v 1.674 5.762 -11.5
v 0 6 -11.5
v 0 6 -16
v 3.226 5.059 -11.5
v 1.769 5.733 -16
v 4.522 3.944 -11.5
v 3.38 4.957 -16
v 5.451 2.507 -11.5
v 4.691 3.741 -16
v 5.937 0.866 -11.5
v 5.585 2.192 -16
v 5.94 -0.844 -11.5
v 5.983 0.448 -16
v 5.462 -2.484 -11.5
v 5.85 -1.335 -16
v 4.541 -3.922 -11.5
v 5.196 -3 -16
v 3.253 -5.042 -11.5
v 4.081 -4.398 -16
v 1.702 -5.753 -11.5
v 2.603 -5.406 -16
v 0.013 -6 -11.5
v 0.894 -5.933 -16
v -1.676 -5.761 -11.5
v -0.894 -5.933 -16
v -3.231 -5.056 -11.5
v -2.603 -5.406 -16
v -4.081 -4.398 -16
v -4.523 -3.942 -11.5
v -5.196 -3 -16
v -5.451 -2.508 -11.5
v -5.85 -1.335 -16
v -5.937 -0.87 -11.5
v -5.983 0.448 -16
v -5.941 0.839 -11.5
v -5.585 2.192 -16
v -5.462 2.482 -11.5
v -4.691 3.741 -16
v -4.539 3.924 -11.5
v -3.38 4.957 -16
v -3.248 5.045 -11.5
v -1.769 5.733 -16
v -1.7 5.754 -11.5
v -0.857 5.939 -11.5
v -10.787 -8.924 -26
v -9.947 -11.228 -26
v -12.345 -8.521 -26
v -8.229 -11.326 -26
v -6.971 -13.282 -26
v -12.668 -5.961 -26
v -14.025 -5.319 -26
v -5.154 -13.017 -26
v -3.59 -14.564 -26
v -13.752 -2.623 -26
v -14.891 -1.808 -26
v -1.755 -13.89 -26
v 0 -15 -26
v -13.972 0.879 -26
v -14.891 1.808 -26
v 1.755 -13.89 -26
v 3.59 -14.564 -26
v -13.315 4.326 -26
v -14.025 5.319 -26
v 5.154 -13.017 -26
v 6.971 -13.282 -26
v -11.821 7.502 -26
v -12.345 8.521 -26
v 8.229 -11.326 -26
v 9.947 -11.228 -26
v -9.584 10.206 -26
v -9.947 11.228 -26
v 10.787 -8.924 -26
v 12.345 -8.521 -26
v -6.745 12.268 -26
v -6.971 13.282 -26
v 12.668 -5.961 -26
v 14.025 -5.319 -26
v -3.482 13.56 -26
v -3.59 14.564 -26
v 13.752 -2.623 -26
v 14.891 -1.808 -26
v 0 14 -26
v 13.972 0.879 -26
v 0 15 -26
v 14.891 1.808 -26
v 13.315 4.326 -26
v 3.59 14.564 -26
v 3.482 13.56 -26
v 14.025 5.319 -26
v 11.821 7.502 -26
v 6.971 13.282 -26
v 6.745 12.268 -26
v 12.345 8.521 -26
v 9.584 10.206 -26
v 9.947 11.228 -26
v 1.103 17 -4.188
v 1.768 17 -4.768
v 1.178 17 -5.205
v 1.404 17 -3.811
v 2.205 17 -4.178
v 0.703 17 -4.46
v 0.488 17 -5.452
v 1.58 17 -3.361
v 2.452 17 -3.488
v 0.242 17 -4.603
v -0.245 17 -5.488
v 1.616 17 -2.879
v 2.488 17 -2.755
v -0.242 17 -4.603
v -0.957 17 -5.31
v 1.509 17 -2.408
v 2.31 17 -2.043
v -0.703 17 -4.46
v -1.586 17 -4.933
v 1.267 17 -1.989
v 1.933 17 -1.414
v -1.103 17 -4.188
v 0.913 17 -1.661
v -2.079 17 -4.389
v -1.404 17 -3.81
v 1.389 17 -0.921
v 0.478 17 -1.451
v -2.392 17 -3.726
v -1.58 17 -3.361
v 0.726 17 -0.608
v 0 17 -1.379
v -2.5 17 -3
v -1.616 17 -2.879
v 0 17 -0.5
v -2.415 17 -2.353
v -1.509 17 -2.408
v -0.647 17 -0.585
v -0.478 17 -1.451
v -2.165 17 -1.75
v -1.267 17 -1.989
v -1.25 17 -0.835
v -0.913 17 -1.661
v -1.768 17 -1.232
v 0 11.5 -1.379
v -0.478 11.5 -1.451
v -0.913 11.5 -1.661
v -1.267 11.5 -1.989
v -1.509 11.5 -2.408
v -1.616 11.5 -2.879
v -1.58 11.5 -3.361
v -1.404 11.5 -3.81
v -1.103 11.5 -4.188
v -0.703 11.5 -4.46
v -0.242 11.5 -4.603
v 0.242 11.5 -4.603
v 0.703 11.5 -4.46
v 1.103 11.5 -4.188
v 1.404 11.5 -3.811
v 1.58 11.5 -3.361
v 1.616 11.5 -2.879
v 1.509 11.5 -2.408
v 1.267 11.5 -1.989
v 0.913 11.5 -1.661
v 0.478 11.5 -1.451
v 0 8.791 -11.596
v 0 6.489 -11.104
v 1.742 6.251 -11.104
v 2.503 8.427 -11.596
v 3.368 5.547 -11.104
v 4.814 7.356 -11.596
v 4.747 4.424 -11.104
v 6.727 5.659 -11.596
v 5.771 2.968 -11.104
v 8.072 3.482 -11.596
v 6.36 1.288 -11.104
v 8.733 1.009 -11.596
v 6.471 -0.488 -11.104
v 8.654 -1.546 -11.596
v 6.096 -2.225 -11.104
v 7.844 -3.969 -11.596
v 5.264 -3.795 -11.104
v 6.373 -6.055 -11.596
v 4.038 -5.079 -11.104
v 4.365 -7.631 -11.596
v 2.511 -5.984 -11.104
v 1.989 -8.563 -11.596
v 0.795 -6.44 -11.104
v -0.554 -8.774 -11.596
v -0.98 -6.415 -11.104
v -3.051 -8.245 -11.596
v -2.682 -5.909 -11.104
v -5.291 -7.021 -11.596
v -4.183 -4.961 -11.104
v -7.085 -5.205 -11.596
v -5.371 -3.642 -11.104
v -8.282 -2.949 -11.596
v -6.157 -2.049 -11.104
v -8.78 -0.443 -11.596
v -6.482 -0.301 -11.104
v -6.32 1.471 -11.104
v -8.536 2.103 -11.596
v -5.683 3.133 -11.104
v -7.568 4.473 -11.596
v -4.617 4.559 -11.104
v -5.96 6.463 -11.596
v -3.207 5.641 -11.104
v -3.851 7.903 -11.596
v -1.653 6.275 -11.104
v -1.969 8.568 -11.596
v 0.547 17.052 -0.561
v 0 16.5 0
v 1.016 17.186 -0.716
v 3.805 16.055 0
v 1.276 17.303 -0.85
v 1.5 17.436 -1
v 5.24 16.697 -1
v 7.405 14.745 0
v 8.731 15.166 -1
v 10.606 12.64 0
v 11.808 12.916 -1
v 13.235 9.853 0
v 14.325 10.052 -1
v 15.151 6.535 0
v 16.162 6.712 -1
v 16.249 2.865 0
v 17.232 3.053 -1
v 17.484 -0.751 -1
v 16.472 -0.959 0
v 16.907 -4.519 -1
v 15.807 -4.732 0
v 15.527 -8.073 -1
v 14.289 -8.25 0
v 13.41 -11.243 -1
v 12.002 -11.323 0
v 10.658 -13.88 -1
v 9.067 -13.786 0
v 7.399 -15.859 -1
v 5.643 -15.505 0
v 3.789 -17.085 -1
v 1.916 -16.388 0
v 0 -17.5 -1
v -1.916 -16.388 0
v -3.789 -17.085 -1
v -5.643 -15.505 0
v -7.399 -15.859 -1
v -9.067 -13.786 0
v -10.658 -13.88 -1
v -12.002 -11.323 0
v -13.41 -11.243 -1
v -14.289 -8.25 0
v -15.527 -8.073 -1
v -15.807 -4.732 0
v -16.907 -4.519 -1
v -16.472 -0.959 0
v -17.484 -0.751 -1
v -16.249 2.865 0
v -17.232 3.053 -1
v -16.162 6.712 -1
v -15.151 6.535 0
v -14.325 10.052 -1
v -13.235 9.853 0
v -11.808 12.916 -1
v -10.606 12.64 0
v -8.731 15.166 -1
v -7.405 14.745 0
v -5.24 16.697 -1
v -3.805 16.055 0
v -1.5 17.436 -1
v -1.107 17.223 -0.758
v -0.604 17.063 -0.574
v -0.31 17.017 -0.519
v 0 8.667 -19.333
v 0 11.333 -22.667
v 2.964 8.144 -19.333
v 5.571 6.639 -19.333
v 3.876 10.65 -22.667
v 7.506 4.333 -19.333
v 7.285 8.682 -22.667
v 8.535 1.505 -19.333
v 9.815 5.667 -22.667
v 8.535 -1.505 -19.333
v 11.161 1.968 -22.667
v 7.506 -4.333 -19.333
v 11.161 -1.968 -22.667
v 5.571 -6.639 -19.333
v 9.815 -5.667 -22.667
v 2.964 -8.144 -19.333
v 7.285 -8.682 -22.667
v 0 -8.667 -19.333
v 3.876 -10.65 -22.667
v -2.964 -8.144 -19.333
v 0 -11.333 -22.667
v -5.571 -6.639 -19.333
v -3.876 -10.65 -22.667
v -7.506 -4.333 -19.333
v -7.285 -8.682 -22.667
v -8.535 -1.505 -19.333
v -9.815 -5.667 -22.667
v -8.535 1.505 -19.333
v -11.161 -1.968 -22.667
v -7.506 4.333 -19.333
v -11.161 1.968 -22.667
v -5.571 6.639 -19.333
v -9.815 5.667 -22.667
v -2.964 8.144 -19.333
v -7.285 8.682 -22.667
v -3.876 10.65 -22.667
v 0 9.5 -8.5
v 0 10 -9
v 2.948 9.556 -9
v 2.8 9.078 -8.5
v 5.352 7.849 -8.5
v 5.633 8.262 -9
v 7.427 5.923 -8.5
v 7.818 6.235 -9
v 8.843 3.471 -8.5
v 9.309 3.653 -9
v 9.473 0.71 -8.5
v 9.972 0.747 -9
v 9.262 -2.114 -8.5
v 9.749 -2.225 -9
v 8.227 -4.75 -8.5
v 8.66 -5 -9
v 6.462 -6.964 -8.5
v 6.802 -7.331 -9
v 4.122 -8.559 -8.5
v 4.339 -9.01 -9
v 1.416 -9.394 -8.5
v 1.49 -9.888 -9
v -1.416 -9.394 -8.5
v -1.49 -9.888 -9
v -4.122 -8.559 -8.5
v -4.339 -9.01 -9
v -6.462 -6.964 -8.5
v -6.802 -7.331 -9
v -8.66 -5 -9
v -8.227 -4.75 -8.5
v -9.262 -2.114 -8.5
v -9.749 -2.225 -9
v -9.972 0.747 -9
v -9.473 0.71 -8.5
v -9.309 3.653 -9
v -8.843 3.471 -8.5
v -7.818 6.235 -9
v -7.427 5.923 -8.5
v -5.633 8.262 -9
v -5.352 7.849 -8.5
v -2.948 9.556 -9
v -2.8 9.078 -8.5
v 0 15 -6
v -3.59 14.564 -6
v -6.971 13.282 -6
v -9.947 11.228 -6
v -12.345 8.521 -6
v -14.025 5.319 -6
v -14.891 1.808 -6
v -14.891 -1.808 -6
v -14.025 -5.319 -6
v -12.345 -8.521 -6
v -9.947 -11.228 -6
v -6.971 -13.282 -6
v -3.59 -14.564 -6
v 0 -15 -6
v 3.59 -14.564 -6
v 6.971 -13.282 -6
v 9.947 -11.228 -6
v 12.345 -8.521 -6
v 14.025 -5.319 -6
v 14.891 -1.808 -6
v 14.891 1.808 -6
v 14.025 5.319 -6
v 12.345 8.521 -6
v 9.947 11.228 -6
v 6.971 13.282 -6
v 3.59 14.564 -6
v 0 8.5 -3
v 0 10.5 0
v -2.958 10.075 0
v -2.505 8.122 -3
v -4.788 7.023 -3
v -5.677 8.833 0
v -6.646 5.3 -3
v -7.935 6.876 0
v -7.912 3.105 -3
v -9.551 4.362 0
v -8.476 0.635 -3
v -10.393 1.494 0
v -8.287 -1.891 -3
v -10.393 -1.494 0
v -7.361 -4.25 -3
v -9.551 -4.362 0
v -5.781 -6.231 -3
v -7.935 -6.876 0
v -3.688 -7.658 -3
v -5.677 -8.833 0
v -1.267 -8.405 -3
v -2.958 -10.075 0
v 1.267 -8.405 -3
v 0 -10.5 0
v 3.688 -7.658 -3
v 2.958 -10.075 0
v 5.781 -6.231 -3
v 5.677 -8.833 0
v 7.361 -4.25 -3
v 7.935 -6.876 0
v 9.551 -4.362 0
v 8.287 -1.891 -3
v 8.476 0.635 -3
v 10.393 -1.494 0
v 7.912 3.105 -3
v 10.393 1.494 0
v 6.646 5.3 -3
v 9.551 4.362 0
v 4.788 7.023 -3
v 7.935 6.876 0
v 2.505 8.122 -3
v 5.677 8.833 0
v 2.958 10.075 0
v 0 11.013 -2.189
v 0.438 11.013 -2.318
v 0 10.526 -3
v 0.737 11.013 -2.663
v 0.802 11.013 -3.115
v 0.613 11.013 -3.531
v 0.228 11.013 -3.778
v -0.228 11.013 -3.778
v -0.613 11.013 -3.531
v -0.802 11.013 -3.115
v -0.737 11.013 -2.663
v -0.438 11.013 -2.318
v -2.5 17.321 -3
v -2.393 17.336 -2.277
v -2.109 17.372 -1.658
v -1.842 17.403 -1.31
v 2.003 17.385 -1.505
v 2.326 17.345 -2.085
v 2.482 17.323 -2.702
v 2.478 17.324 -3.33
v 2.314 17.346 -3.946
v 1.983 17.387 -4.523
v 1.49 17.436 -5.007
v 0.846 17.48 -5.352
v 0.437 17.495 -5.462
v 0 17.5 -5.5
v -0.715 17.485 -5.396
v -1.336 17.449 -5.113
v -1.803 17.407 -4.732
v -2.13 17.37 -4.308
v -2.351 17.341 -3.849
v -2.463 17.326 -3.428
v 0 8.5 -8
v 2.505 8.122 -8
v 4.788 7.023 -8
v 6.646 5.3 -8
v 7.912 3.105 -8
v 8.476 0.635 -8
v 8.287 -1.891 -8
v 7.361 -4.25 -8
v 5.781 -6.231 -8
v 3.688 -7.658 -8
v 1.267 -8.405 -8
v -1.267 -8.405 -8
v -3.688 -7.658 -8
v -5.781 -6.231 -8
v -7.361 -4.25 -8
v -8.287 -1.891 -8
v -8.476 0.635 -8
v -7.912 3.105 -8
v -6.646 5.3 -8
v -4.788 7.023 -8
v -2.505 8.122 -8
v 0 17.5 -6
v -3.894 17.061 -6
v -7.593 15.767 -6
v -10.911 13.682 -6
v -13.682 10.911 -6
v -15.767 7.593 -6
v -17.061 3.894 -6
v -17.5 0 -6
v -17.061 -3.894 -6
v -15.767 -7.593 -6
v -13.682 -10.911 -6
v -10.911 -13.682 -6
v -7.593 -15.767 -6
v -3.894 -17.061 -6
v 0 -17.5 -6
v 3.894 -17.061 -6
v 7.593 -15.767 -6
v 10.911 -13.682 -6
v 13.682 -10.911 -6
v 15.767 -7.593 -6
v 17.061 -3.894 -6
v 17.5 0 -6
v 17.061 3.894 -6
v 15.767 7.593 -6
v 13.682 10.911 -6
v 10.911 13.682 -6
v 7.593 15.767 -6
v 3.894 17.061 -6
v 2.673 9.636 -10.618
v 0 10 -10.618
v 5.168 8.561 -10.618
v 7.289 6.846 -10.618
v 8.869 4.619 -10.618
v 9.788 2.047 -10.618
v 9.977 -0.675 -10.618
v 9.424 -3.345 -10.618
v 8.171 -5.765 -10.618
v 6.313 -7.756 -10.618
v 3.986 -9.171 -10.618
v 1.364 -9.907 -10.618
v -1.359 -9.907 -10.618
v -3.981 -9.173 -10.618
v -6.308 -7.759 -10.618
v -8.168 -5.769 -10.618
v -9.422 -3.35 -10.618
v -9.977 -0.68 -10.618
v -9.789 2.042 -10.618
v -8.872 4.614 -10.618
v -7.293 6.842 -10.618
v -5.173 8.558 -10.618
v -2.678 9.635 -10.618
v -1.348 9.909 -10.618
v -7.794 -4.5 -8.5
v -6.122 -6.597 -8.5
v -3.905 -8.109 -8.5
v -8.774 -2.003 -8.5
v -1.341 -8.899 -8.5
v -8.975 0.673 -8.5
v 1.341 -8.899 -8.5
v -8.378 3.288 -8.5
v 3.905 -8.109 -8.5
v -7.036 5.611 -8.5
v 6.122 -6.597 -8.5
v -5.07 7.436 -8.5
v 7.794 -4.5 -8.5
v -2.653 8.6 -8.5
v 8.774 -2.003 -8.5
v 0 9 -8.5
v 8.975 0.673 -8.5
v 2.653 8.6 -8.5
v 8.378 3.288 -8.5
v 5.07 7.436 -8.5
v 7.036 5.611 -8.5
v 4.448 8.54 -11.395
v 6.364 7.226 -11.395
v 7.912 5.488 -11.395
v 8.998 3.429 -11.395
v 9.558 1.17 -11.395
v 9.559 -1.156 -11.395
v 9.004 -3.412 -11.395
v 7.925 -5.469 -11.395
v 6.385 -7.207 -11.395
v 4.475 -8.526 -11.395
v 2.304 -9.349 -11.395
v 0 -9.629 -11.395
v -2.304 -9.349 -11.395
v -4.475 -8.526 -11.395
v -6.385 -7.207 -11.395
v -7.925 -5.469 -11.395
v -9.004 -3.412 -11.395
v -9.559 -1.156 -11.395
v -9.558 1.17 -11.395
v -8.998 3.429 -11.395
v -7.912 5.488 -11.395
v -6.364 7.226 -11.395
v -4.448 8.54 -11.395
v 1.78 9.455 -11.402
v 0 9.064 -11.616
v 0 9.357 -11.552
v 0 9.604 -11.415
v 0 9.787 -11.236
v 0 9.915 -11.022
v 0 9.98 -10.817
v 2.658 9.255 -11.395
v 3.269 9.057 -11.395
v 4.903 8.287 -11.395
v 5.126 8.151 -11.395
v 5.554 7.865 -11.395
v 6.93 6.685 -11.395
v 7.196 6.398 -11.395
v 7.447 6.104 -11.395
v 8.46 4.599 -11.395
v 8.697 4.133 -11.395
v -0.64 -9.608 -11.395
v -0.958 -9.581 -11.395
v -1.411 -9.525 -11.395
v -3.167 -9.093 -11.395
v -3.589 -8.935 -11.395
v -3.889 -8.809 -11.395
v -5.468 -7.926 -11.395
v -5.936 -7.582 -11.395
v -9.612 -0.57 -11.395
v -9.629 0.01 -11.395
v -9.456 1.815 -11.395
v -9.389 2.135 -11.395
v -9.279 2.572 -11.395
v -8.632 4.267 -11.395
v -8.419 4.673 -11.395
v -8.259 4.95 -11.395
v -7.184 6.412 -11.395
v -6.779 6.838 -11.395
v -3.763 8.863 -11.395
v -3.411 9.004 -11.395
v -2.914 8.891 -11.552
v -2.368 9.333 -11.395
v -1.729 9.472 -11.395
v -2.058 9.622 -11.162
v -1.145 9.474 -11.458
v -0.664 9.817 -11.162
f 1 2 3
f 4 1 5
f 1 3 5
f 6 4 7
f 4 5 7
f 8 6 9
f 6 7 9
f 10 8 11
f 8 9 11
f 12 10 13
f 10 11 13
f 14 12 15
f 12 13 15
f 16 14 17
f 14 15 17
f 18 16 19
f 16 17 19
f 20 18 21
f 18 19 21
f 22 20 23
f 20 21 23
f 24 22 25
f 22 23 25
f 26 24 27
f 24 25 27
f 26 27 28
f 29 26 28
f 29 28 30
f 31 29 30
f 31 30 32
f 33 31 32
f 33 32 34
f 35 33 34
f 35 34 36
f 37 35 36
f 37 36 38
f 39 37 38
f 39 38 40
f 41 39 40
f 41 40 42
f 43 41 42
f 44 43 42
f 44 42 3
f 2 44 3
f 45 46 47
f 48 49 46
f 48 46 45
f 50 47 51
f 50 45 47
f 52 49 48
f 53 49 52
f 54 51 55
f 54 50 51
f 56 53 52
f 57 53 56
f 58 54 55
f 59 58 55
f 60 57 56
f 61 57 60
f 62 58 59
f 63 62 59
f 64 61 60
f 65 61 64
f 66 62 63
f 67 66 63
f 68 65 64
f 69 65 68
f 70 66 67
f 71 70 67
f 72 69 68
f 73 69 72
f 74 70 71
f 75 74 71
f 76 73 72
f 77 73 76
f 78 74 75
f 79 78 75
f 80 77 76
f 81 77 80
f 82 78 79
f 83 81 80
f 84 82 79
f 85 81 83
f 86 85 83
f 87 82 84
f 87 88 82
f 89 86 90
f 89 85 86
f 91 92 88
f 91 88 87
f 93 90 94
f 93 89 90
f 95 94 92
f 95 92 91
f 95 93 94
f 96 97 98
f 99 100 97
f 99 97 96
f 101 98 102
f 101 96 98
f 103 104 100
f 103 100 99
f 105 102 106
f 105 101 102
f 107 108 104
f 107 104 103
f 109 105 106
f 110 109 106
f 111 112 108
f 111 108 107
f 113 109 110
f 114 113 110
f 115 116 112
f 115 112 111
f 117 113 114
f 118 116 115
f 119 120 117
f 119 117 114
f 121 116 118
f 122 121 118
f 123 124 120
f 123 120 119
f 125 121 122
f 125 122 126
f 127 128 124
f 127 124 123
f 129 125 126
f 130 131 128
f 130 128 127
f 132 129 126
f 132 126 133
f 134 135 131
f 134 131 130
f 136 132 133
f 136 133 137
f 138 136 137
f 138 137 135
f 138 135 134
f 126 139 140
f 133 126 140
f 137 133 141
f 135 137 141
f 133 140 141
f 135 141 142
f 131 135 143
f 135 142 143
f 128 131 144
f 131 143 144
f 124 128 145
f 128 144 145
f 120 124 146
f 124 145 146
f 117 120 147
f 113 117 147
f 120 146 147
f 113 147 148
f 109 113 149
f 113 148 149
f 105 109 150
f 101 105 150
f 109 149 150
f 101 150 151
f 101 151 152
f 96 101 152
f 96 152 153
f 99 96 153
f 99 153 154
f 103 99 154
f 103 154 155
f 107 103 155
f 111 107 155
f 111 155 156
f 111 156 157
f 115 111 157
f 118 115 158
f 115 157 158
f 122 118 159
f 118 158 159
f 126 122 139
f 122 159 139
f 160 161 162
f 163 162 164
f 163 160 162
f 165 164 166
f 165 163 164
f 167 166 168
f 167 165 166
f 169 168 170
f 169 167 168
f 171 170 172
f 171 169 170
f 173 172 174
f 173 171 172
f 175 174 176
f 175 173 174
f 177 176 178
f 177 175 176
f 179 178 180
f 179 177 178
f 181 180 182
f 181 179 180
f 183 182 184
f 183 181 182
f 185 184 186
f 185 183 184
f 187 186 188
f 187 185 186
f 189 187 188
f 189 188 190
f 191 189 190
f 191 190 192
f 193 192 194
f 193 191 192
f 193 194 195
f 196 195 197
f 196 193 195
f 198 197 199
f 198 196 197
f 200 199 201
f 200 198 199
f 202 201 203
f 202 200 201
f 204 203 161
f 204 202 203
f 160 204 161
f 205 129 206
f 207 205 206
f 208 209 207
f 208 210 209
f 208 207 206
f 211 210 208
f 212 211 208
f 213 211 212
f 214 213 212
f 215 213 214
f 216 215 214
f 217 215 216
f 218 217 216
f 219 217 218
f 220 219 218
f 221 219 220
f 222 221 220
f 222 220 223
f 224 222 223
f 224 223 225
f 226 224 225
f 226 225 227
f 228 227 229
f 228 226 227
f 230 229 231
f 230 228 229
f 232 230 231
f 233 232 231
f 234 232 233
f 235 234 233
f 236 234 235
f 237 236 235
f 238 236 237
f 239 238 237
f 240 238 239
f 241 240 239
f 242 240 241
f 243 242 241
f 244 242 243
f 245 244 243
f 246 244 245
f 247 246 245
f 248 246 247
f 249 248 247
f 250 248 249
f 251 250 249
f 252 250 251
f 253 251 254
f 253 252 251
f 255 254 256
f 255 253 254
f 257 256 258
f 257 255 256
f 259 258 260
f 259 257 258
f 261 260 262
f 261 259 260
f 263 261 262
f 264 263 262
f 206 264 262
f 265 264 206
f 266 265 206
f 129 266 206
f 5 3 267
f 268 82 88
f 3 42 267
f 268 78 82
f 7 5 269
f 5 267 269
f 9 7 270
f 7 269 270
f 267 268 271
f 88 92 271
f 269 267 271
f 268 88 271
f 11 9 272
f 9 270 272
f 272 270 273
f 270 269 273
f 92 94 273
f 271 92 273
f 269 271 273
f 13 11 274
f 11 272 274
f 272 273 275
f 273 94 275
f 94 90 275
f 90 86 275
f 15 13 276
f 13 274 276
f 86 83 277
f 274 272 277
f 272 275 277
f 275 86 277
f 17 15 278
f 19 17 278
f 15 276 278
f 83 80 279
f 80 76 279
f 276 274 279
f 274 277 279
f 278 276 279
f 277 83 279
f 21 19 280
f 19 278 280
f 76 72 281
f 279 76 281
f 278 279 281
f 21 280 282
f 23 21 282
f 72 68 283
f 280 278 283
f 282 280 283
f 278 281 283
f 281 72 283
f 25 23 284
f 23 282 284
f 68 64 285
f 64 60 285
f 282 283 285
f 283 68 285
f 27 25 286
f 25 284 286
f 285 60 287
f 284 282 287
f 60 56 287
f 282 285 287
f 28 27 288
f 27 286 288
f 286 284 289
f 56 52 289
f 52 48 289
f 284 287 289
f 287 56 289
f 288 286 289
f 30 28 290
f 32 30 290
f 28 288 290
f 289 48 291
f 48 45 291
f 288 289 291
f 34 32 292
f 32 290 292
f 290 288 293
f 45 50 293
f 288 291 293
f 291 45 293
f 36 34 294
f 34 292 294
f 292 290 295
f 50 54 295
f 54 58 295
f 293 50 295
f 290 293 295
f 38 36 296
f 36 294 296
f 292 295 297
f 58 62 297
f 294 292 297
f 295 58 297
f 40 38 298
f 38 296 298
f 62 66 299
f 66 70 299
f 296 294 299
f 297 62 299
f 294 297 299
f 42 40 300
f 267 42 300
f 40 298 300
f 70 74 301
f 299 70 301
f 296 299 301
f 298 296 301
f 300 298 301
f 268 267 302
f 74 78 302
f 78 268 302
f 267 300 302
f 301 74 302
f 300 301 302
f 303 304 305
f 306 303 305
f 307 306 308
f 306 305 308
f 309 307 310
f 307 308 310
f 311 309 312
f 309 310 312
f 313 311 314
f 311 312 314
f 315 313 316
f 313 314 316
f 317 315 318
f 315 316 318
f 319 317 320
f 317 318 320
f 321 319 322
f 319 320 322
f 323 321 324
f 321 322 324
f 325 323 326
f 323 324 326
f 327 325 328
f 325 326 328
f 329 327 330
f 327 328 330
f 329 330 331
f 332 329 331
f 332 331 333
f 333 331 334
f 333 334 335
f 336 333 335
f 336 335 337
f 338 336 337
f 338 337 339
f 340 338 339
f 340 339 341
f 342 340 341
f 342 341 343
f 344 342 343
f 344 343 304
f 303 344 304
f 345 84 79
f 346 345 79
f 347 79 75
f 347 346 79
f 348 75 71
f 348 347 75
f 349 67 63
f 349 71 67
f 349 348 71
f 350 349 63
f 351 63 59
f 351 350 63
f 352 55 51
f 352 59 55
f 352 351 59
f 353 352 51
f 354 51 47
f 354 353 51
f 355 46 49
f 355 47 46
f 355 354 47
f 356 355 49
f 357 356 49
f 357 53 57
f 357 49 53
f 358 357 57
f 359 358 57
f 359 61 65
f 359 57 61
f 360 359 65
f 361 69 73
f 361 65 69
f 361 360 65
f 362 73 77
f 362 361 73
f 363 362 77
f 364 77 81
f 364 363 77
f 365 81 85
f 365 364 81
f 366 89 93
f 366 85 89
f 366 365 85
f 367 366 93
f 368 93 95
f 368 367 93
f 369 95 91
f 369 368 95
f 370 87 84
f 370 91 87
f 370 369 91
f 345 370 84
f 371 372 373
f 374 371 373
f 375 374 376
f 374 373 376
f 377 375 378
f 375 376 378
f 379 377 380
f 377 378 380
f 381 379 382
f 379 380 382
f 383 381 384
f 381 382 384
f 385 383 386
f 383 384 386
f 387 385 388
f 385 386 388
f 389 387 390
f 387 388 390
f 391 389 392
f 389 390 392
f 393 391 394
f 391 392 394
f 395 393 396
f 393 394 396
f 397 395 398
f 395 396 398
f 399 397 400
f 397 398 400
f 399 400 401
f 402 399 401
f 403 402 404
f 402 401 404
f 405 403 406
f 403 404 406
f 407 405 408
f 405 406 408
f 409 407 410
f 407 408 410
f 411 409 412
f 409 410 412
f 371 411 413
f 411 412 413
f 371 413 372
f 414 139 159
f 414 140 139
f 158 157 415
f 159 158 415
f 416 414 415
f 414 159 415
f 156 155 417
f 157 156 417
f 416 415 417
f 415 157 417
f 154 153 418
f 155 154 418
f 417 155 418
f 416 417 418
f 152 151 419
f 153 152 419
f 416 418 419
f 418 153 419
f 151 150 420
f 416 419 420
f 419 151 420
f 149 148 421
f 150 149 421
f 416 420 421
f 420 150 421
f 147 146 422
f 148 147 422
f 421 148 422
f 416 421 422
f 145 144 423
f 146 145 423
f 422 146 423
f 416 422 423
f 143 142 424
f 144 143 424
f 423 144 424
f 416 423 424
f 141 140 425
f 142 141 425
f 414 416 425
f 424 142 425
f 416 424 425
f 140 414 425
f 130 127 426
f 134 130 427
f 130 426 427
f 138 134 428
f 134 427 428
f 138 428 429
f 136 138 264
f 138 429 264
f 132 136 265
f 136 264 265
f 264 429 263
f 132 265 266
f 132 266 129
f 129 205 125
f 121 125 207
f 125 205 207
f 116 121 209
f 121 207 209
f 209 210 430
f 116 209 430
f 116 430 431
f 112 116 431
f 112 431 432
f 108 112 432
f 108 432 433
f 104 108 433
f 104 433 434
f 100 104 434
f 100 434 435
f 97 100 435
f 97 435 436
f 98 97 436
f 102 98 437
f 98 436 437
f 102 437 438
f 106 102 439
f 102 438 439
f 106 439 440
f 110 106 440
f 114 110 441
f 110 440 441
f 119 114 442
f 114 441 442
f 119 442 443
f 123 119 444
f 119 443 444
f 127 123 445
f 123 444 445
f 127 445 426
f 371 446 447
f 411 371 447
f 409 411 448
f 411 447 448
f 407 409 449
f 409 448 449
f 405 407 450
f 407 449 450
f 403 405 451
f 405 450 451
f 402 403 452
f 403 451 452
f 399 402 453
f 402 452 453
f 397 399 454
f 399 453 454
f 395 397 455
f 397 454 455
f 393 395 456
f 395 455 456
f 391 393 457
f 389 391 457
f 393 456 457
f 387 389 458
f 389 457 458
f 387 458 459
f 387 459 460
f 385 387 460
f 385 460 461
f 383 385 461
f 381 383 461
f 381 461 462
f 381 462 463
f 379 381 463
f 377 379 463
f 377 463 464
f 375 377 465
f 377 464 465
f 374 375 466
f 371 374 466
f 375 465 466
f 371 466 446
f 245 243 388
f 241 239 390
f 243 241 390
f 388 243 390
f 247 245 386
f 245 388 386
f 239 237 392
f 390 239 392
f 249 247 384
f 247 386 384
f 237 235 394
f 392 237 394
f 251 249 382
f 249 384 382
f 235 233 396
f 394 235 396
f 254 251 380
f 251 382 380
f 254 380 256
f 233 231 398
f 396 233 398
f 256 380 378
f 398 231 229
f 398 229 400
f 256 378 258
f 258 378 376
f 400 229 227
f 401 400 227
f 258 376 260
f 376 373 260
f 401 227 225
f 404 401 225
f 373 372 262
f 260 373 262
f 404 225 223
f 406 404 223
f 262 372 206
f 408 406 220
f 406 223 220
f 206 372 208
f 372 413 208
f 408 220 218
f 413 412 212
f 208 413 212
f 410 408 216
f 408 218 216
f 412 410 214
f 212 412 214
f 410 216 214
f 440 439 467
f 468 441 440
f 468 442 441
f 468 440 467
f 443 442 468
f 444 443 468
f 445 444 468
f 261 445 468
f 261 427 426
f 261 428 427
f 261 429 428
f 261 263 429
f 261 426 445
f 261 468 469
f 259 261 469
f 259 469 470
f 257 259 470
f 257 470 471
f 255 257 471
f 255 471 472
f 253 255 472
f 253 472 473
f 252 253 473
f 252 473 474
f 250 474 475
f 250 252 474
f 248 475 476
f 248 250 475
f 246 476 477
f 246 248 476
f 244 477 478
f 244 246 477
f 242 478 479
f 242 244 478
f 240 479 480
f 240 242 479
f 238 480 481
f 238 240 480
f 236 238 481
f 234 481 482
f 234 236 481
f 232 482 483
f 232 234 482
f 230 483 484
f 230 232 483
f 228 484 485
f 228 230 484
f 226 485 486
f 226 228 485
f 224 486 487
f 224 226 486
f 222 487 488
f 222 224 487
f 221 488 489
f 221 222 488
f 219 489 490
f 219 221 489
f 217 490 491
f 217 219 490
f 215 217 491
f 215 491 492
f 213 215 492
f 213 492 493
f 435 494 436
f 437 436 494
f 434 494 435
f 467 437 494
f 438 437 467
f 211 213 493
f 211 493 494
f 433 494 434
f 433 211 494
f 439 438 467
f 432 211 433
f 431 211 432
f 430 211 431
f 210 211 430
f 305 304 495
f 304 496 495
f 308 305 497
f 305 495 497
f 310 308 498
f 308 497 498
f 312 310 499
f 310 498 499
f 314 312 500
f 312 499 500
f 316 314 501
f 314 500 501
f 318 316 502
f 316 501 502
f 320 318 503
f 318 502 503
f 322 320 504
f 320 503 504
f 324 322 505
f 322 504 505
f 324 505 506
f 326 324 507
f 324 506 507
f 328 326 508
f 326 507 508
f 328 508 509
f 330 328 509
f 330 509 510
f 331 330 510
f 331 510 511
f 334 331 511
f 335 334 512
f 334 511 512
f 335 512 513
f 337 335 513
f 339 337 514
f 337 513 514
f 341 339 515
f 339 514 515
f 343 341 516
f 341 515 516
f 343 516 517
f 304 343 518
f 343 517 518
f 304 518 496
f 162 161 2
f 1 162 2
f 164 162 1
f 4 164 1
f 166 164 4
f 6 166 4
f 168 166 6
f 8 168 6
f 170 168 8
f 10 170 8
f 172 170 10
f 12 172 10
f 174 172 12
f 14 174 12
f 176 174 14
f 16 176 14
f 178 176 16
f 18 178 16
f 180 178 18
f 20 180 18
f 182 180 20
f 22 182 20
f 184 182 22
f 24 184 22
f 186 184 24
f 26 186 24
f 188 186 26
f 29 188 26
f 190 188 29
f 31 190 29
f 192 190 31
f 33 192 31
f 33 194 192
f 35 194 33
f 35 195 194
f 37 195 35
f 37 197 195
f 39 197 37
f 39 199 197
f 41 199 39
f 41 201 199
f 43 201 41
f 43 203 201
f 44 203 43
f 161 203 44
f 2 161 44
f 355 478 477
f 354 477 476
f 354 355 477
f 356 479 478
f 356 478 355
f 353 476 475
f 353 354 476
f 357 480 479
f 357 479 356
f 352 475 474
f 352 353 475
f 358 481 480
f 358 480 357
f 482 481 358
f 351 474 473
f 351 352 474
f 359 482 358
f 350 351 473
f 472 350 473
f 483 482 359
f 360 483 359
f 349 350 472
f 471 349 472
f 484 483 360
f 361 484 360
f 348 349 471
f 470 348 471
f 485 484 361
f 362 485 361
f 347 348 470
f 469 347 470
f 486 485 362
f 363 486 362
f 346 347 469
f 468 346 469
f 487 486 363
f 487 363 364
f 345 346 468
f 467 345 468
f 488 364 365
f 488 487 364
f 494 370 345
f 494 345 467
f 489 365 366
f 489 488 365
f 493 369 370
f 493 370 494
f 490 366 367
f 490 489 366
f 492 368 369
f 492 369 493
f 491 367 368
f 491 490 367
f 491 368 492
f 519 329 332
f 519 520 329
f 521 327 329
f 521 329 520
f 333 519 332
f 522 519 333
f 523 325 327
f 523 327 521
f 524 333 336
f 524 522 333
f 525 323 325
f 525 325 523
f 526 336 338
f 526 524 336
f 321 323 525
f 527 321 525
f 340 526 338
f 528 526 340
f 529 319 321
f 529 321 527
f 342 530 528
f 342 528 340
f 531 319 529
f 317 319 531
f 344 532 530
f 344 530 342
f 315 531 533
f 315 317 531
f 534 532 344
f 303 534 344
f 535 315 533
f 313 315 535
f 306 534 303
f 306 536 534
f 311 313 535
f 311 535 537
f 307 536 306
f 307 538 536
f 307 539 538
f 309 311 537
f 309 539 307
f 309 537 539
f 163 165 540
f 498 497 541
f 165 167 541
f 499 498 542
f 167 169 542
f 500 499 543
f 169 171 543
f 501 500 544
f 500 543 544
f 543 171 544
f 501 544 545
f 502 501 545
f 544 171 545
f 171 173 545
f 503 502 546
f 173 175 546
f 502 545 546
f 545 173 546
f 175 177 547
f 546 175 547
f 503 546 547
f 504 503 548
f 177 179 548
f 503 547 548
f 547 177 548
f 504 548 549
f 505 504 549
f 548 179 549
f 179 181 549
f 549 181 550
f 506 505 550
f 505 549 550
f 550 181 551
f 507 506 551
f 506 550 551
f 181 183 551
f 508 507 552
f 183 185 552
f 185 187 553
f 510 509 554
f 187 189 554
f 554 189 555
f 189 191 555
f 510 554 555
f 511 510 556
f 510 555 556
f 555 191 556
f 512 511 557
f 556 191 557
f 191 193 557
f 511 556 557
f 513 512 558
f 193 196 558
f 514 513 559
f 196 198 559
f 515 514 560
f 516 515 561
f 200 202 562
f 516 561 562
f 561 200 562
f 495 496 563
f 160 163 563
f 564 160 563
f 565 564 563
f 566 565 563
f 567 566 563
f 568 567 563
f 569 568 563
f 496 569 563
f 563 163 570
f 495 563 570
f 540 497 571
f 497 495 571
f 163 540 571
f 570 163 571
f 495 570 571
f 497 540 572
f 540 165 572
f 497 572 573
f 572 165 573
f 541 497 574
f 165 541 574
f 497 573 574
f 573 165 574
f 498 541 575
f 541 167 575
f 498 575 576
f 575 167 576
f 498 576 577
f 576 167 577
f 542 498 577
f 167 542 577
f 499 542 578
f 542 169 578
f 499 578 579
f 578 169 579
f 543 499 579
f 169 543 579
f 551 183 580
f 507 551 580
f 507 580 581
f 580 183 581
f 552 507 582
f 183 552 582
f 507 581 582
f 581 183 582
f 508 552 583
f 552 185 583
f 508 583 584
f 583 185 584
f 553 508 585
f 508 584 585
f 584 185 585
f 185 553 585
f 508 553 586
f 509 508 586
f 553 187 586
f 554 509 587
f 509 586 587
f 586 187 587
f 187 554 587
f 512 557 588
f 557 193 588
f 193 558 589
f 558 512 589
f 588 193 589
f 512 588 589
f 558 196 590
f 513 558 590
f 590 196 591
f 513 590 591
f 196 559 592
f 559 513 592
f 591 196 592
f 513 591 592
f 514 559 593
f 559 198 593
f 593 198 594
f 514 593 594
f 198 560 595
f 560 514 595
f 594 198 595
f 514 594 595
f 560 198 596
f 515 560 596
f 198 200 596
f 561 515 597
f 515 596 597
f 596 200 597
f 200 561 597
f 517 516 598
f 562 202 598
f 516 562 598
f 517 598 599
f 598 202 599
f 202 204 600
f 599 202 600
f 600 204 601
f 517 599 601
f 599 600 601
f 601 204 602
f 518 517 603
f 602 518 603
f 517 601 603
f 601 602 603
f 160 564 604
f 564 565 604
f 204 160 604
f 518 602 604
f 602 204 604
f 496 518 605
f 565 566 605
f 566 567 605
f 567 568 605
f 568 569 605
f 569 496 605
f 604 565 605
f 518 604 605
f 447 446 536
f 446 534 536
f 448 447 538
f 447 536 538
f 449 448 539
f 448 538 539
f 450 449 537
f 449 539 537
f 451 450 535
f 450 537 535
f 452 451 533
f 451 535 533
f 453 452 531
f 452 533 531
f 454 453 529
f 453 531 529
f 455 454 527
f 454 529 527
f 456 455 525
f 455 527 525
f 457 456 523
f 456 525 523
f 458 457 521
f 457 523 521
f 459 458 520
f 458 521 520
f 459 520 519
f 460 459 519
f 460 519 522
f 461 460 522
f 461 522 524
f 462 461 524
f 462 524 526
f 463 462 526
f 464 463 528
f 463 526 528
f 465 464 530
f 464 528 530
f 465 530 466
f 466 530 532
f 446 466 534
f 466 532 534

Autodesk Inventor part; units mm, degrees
ref_plane "YZ Plane" through (0, 0, 0) normal (1, 0, 0) x (0, 1, 0)
ref_plane "XY Plane" through (0, 0, 0) normal (0, 0, 1) x (1, 0, 0)
sketch "Esquisse1" plane through (0, 0, 0) normal (1, 0, 0) x (0, 1, 0)
  line L0 (0, 0) -> (0, -31.3963)
  line L1 (8.5, -3) -> (8.5, -8.5)
  line L2 (16.5, 0) -> (10.5, 0)
  line L3 (10.5, 0) -> (8.5, -3)
  circle A0 centre (8.5, -10) radius 1.5 construction
  line L4 (8.5, -8.5) -> (10, -8.5)
  line L5 (10, -8.5) -> (10, -11.8541)
  line L6 (10, -11.8541) -> (6, -11)
  line L7 (6, -11) -> (6, -16)
  line L8 (6, -16) -> (14, -26)
  line L9 (14, -26) -> (15, -26)
  line L10 (15, -26) -> (15, -6)
  line L11 (15, -6) -> (17.5, -6)
  line L12 (17.5, -6) -> (17.5, -1)
  line L13 (16.5, 0) -> (17.5, -1)
  dimension "d3" = 17
  dimension "d4" = 3
  dimension "d5" = 2
  dimension "d7" = 3
  dimension "d9" = 12
  dimension "d10" = 2.5
  dimension "d11" = 11
  dimension "d12" = 5
  dimension "d13" = 1
  dimension "d14" = 30
  dimension "d15" = 10
  dimension "d19" = 2.5
  dimension "d20" = 20
  dimension "d97" = 1
  dimension "d98" = 1
revolve "Révolution1" add sketch "Esquisse1" angle 360 about axis through (0, 0, 0) along (0, 0, -1)
thread "Filetage1" size "M30x2" class "6g" standard "ISO Metric profile" full length
fillet "Congé1" radius 1 1 edges at (0, -10, -11.8541)
chamfer "Chanfrein1" distance 0.5 angle 45 3 edges at (0, -8.5, -8.5) (0, -6, -11) (0, -10, -8.5)
ref_plane "Plan de construction3" through (0, 17.5, -3.5) normal (0, 1, 0) x (-1, 0, 0)
sketch "Esquisse9" plane through (0, 17.5, -3.5) normal (0, 1, 0) x (-1, 0, 0)
  circle A0 centre (0, 0.5) radius 2.5
  line L0 (-10.5, 3.5) -> (10.5, 3.5) projected
  line L1 (-8.5, 0.5) -> (8.5, 0.5) projected
  point P0 (0, 3.5)
  point P1 (0, 3.5)
  dimension "d85" = 5
extrude "Extrusion4" cut sketch "Esquisse9" against normal blind 0.5
sketch "Esquisse10" plane through (0, 17, -3) normal (0, 1, 0) x (1, 0, 0)
  circle A0 centre (0, 0) radius 2.5 projected
  point P0 (0, -3)
  point P1 (0, -2.5)
hole "Perçage3" at (0, 17, -3) direction (0, -1, 0) diameter 3.242 depth 5.5 tip angle 118 thread size "M4x0.7" class "6H" standard "ISO Metric profile"
properties part number "reservoir_jointure" material "Aluminium 6061"
